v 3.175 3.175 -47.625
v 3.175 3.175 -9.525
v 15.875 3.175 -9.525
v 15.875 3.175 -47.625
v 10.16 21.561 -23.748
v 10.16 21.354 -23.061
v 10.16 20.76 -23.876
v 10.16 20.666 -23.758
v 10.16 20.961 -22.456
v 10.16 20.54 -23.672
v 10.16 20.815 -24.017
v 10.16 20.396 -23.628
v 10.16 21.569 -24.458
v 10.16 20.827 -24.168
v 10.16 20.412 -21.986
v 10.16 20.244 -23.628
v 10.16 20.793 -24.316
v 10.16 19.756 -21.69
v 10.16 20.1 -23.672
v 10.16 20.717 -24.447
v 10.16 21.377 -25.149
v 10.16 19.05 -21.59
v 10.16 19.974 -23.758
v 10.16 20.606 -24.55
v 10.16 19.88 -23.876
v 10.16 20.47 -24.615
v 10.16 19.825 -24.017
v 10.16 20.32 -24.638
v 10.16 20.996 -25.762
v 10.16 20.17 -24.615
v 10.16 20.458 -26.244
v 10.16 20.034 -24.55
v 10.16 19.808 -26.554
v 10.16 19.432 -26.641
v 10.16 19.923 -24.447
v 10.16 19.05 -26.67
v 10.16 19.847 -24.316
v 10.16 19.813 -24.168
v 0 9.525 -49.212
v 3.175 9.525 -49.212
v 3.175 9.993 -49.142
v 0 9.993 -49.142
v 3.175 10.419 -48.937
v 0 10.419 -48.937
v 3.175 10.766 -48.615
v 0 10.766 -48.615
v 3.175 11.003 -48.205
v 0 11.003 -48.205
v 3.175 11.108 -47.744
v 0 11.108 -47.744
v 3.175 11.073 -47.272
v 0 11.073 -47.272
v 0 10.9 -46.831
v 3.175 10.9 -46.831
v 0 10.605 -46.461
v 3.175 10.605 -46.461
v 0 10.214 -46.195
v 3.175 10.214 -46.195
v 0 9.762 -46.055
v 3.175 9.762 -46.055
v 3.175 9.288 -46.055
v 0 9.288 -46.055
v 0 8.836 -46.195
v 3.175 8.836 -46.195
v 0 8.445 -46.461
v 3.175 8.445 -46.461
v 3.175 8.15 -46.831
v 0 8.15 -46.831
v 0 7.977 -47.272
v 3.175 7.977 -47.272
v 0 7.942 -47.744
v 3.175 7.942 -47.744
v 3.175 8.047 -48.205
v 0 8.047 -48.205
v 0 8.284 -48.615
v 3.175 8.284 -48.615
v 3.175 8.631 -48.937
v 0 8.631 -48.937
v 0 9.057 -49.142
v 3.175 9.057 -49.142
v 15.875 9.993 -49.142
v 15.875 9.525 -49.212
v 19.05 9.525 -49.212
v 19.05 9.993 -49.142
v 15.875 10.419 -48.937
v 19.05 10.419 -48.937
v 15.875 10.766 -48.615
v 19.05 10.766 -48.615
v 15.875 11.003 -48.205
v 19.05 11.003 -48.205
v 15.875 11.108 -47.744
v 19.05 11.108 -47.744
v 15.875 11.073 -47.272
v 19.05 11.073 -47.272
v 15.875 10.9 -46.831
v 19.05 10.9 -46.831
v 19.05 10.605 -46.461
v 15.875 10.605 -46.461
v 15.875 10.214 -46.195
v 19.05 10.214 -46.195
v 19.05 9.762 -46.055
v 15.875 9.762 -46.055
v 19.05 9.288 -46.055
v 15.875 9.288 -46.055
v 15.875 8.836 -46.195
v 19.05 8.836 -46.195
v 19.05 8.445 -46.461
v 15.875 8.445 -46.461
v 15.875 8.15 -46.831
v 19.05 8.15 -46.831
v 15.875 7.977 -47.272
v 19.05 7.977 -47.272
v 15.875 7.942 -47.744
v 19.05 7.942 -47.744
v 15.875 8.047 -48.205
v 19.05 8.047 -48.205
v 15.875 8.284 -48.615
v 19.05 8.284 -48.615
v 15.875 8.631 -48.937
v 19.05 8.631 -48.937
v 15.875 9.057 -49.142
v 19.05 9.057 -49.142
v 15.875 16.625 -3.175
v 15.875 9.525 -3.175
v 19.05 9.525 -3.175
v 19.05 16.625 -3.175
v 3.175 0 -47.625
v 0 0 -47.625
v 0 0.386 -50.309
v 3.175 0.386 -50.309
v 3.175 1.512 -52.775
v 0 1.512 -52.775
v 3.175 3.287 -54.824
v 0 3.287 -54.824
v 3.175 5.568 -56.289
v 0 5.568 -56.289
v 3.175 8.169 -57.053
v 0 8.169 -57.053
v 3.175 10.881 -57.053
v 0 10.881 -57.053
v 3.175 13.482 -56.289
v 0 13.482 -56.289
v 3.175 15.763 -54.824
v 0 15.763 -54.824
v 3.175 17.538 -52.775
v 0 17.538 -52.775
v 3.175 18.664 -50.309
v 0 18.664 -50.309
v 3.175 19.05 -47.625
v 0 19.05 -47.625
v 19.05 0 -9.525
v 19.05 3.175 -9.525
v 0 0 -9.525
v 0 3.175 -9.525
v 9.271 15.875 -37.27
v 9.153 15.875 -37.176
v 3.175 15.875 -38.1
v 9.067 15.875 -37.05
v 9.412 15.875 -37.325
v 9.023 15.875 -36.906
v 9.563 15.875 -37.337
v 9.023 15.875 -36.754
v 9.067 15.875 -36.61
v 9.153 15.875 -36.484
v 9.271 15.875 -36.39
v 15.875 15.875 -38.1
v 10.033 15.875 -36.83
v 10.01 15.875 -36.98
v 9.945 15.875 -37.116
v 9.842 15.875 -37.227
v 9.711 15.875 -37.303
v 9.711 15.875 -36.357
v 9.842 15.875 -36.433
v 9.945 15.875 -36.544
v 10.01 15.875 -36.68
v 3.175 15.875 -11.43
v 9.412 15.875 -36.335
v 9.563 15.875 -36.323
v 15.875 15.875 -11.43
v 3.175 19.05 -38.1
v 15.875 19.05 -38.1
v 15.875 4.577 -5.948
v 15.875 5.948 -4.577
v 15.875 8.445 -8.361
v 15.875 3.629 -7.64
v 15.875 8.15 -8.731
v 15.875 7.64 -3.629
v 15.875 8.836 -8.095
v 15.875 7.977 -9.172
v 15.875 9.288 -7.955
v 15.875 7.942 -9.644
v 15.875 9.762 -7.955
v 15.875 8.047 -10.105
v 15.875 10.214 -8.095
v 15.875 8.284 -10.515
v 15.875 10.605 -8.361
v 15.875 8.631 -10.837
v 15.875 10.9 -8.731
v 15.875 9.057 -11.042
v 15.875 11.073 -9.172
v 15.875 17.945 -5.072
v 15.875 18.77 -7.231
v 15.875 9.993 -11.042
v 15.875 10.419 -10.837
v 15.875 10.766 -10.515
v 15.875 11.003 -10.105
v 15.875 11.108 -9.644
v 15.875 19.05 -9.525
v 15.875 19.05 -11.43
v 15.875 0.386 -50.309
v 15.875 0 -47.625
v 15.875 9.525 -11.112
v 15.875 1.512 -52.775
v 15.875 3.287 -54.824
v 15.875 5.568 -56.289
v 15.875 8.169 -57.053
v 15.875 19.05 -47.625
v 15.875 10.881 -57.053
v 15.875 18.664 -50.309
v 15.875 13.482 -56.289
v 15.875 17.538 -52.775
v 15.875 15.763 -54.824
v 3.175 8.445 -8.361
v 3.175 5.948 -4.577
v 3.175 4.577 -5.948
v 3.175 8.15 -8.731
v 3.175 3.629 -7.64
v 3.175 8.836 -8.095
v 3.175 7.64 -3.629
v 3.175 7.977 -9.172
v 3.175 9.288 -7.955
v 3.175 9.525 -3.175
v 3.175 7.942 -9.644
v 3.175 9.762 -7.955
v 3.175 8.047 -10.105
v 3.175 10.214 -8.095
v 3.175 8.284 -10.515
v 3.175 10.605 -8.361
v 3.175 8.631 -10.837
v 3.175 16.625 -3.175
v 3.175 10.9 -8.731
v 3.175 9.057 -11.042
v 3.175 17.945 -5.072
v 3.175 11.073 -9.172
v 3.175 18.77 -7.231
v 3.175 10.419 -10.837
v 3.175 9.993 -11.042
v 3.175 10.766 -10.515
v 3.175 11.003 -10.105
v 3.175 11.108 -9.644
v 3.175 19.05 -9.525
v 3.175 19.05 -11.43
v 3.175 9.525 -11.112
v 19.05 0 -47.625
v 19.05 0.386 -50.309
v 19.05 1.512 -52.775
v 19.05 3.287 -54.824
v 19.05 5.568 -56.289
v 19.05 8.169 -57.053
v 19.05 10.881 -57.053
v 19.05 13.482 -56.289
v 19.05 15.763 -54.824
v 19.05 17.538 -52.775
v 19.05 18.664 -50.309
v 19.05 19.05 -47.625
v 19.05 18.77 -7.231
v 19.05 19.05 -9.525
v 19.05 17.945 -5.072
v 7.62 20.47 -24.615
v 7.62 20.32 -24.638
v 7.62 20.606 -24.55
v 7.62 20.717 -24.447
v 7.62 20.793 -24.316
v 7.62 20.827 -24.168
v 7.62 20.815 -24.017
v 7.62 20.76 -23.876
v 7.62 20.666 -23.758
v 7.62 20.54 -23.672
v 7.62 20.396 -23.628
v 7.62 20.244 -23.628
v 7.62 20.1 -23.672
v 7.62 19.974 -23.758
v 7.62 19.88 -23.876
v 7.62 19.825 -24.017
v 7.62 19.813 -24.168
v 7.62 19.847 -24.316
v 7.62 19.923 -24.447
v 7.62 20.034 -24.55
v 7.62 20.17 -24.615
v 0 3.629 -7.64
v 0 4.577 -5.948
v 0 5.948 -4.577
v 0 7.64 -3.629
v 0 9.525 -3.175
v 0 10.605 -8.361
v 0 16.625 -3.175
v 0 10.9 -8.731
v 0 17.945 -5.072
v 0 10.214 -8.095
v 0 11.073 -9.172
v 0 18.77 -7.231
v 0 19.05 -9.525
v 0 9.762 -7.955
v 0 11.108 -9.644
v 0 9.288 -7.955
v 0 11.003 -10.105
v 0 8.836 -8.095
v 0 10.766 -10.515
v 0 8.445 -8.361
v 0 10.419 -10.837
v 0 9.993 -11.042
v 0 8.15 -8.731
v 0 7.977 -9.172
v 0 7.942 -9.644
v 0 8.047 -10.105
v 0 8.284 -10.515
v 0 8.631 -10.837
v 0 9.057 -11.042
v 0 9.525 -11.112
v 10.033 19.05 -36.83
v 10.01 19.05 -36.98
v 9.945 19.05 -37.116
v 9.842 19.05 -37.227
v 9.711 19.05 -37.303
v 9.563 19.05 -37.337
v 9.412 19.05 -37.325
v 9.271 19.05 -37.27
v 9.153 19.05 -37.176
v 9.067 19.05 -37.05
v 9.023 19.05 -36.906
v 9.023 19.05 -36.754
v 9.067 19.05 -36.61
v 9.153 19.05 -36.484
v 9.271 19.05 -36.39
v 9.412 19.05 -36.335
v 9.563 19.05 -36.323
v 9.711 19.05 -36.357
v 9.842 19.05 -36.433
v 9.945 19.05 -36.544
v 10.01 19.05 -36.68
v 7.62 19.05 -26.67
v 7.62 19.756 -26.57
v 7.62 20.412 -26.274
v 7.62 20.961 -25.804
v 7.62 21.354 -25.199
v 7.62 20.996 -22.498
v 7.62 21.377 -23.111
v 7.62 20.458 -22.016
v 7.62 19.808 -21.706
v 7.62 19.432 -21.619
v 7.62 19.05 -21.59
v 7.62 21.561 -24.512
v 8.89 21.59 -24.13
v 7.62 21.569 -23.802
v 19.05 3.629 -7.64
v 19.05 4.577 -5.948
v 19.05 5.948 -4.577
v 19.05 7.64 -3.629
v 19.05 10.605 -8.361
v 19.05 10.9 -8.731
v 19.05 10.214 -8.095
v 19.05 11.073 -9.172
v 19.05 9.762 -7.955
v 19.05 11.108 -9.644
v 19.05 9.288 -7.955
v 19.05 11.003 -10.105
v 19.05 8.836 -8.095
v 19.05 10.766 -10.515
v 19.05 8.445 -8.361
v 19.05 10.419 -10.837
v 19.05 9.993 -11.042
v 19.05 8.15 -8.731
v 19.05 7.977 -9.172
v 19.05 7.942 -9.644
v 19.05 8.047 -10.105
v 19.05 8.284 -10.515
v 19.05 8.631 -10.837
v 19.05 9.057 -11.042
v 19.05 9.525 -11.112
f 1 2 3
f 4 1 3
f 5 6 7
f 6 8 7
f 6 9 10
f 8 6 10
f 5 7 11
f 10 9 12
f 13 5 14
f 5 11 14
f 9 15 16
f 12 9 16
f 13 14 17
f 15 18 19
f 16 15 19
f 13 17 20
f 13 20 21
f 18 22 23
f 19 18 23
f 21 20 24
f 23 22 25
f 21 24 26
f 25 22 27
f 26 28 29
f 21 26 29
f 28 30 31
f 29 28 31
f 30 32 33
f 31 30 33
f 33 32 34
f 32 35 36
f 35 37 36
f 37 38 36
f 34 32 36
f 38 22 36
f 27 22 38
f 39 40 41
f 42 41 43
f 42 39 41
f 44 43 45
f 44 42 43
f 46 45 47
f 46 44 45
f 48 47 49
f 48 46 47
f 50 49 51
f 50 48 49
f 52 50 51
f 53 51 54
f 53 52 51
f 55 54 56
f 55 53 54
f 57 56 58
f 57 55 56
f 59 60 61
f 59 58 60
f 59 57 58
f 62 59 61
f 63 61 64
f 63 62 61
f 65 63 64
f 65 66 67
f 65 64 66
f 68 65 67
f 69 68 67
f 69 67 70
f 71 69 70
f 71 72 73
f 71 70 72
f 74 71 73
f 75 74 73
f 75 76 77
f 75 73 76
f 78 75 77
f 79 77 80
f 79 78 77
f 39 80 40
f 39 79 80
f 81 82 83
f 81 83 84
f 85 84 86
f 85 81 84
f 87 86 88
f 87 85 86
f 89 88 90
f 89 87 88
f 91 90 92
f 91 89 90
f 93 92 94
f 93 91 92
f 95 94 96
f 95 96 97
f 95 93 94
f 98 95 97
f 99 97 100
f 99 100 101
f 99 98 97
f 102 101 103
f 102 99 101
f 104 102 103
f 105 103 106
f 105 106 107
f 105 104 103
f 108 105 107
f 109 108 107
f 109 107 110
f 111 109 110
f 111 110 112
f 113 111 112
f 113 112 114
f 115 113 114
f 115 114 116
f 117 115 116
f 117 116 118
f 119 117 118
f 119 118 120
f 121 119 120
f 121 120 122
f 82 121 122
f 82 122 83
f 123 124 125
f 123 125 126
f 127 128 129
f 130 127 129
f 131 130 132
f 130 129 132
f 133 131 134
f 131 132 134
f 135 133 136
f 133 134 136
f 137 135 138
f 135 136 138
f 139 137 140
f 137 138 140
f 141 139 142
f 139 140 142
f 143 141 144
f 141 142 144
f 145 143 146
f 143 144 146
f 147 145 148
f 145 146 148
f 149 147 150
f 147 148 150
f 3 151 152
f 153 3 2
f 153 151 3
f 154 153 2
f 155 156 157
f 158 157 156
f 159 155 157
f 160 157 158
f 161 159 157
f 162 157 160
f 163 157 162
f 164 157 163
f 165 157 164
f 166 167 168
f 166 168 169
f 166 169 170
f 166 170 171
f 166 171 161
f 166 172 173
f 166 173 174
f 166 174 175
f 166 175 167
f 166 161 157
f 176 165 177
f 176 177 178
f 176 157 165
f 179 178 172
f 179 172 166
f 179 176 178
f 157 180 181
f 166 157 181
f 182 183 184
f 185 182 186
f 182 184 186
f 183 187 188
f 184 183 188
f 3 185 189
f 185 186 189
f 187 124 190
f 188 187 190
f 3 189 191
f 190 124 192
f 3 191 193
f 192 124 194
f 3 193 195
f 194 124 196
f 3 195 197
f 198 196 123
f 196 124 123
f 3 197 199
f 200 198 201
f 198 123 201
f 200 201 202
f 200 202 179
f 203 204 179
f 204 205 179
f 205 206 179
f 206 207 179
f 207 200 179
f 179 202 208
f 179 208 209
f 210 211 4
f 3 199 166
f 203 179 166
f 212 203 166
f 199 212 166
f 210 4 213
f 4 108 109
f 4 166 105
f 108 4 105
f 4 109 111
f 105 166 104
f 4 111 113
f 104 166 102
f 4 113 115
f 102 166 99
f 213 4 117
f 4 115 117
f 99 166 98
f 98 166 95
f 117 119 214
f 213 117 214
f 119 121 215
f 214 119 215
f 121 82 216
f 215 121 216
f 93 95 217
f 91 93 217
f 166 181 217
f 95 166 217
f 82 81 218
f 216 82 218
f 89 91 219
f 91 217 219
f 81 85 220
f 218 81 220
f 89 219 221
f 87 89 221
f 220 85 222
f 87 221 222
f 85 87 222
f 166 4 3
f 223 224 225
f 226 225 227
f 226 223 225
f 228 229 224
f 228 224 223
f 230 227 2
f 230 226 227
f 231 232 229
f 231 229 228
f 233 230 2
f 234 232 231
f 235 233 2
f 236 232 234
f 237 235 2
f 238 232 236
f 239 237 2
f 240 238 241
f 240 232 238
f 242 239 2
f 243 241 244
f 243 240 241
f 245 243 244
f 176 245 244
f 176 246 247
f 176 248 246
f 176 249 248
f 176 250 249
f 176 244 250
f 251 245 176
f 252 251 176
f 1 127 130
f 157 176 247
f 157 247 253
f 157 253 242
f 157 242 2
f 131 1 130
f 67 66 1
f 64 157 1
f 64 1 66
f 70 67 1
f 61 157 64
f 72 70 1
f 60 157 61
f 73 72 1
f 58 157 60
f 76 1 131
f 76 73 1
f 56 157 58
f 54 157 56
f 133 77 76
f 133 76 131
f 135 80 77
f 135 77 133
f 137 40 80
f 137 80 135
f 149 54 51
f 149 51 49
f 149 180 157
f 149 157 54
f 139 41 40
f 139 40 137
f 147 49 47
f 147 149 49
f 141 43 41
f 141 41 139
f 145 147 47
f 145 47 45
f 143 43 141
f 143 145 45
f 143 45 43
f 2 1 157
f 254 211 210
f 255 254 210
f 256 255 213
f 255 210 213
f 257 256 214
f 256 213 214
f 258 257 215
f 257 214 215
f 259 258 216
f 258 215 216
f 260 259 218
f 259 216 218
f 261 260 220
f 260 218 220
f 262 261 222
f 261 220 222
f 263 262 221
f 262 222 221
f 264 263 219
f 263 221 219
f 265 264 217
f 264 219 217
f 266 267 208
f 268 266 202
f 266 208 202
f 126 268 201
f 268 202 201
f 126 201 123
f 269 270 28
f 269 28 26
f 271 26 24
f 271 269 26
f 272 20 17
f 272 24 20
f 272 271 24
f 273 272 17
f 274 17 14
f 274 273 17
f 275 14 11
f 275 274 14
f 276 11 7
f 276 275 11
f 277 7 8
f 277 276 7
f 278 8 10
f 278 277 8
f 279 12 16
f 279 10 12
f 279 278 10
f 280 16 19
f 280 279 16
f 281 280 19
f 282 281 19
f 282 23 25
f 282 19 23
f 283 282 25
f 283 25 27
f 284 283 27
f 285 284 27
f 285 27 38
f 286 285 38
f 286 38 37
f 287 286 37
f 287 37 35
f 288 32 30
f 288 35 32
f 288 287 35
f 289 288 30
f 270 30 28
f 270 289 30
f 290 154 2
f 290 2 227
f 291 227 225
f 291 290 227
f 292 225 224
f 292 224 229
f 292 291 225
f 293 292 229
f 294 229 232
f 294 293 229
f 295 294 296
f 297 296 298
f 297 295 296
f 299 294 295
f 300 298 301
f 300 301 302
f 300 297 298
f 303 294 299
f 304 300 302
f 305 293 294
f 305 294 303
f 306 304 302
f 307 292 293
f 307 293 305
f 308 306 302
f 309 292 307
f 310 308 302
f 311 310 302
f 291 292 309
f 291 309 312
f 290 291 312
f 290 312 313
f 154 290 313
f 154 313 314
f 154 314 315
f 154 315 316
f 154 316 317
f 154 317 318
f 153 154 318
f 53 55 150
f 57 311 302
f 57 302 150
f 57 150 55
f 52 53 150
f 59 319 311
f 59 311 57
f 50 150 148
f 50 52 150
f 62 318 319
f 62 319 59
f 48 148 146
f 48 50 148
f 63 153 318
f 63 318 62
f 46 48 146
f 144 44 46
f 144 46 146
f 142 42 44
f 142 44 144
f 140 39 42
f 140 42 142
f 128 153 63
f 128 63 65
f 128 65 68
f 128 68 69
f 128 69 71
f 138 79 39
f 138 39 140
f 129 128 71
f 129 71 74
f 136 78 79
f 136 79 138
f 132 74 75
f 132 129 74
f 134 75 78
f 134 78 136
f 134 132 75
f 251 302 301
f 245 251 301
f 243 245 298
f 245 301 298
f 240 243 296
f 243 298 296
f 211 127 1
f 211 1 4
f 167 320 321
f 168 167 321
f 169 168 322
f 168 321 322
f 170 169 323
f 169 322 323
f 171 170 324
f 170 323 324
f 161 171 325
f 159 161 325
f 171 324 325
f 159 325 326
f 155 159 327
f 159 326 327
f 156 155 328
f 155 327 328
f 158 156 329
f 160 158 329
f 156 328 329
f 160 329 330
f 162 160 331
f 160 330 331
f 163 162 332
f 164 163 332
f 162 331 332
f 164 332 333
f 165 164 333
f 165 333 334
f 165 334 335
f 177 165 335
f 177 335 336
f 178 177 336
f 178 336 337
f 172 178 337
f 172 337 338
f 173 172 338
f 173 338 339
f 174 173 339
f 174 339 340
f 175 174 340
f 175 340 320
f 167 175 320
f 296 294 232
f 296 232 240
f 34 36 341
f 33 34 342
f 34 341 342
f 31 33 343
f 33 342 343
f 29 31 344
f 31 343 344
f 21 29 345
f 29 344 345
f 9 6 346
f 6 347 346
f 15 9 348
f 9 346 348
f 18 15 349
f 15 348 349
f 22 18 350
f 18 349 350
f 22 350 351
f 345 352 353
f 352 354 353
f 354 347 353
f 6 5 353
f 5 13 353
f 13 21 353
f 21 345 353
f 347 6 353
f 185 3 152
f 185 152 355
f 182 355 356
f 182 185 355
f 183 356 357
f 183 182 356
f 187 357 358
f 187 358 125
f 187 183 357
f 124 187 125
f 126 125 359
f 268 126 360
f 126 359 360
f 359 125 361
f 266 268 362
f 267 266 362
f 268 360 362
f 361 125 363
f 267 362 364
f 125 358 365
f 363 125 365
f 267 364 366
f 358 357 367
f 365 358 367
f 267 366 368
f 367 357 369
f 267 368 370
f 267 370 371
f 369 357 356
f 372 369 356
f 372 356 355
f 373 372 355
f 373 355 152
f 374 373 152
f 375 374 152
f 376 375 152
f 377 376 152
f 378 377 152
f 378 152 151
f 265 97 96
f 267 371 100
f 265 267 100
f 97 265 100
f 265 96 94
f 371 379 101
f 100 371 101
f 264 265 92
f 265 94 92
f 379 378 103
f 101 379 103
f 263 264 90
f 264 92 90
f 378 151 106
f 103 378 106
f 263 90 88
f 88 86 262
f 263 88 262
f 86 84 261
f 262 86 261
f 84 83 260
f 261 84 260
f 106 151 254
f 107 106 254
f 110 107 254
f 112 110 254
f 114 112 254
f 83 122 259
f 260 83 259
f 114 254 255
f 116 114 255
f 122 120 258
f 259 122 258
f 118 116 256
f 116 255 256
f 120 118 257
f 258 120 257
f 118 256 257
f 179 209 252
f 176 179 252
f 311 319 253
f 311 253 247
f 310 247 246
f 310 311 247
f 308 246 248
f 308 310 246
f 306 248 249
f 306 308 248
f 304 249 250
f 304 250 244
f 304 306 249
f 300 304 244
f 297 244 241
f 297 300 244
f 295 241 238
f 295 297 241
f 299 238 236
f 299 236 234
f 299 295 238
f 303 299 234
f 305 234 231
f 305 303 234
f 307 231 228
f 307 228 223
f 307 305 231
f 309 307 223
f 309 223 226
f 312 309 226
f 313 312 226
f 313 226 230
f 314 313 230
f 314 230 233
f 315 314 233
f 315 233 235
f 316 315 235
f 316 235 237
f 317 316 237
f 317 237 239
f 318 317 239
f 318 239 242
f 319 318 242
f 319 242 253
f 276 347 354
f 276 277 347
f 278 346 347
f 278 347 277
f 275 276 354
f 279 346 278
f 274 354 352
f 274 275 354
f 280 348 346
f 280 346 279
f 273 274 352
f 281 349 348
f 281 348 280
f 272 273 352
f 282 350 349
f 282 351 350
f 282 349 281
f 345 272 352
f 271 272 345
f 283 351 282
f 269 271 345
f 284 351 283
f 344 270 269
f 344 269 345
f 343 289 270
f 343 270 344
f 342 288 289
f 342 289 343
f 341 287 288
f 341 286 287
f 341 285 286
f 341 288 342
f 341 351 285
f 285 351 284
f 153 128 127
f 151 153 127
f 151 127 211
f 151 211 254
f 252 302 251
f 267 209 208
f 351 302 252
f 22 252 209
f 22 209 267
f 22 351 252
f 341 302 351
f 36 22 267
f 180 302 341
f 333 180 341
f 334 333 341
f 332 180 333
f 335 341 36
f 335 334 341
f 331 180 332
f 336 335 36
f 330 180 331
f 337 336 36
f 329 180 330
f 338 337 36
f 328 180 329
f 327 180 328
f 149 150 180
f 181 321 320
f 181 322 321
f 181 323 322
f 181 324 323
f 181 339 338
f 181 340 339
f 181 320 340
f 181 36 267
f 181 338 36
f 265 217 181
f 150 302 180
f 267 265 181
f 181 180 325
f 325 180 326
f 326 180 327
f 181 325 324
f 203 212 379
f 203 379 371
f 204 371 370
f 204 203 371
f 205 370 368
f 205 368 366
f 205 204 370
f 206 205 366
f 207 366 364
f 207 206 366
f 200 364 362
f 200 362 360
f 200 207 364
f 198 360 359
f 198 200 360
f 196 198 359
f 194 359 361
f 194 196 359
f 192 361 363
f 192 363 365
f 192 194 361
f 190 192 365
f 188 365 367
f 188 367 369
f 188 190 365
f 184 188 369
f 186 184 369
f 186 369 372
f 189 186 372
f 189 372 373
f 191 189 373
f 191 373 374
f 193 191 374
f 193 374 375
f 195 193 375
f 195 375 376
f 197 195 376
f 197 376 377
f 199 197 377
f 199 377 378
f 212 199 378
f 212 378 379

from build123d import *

# Parameters (mm, degrees)
SKETCH1_W           = 19.05
SKETCH1_H           = 57.15
BOSS_EXTRUDE1_DEPTH = 19.05
SKETCH2_W           = 12.7
SKETCH2_H           = 12.7
CUT_EXTRUDE1_DEPTH  = 76.2
SKETCH3_W           = 2.54
SKETCH3_H           = 5.08
BOSS_EXTRUDE2_DEPTH = 2.54
SKETCH4_R           = 0.508
SKETCH4_R_2         = 1.5875
CUT_EXTRUDE2_DEPTH  = 19.05
SKETCH7_R           = 0.508
CUT_EXTRUDE3_DEPTH  = 12.7
SKETCH8_W           = 12.7
SKETCH8_H           = 9.525
CUT_EXTRUDE4_DEPTH  = 25.4
SKETCH11_R          = 1.5875
CUT_EXTRUDE6_DEPTH  = 19.05
SKETCH12_W          = 12.7
SKETCH12_H          = 30.970960978
CUT_EXTRUDE7_DEPTH  = 3.81
SKETCH13_W          = 12.7
SKETCH13_H          = 19.463069007
CUT_EXTRUDE8_DEPTH  = 3.81
CUT_EXTRUDE9_DEPTH  = 19.05


with BuildPart() as part:
    # Sketch1 → Boss-Extrude1 (new body)
    with BuildSketch(Plane(origin=(0, 0, 0), x_dir=(1, 0, 0), z_dir=(0, 1, 0))):
        with Locations((9.525, 28.575)):
            Rectangle(SKETCH1_W, SKETCH1_H)
    extrude(amount=BOSS_EXTRUDE1_DEPTH)

    # Sketch2 → Cut-Extrude1 (cut)
    with BuildSketch(Plane.XY):
        with Locations((9.525, 9.525)):
            Rectangle(SKETCH2_W, SKETCH2_H)
    extrude(amount=-CUT_EXTRUDE1_DEPTH, mode=Mode.SUBTRACT)

    # Sketch3 → Boss-Extrude2 (add)
    with BuildSketch(Plane(origin=(0, 19.05, 0), x_dir=(1, 0, 0), z_dir=(0, 1, 0))):
        with Locations((8.89, 24.13)):
            Rectangle(SKETCH3_W, SKETCH3_H)
    extrude(amount=BOSS_EXTRUDE2_DEPTH)

    # Sketch4 → Cut-Extrude2 (cut)
    with BuildSketch(Plane(origin=(0, 0, 0), x_dir=(0, 0, -1), z_dir=(1, 0, 0))):
        with Locations((24.13, 20.32)):
            Circle(SKETCH4_R)
        with Locations((9.525, 9.525)):
            Circle(SKETCH4_R_2)
        with BuildLine():
            ThreePointArc((26.67, 19.05), (24.13, 24.78976855), (21.59, 19.05))
            add(Edge.make_bspline(
                [(26.67, 19.05), (26.67, 21.59), (24.13, 21.59), (21.59, 21.59), (21.59, 19.05)],
                knots=[3.141592654, 3.141592654, 3.141592654, 4.71238898, 4.71238898, 6.283185307, 6.283185307, 6.283185307], degree=2, weights=[1, 0.707106781, 1, 0.707106781, 1]))
        make_face()
        with BuildLine():
            ThreePointArc((9.525, 19.05), (0, 9.525), (9.525, 0))
            ThreePointArc((9.525, 0), (-29.420443119, 9.525), (9.525, 19.05))
        make_face()
    extrude(amount=CUT_EXTRUDE2_DEPTH, mode=Mode.SUBTRACT)

    # Sketch7 → Cut-Extrude3 (cut)
    with BuildSketch(Plane(origin=(0, 19.05, 0), x_dir=(1, 0, 0), z_dir=(0, 1, 0))):
        with Locations((9.525, 36.83)):
            Circle(SKETCH7_R)
        Polygon((3.175, 0), (3.175, 11.43), (6.35, 11.43), (12.7, 11.43), (15.875, 11.43), (15.875, 0), align=None)
    extrude(amount=-CUT_EXTRUDE3_DEPTH, mode=Mode.SUBTRACT)

    # Sketch8 → Cut-Extrude4 (cut)
    with BuildSketch(Plane(origin=(0, 19.05, 0), x_dir=(1, 0, 0), z_dir=(0, 1, 0))):
        with Locations((9.525, 4.7625)):
            Rectangle(SKETCH8_W, SKETCH8_H)
    extrude(amount=-CUT_EXTRUDE4_DEPTH, mode=Mode.SUBTRACT)

    # Sketch11 → Cut-Extrude6 (cut)
    with BuildSketch(Plane(origin=(0, 0, 0), x_dir=(0, 0, -1), z_dir=(1, 0, 0))):
        with Locations((47.625, 9.525)):
            Circle(SKETCH11_R)
        with BuildLine():
            ThreePointArc((47.625, 0), (57.15, 9.525), (47.625, 19.05))
            ThreePointArc((47.625, 19.05), (63.905355935, 9.525), (47.625, 0))
        make_face()
    extrude(amount=CUT_EXTRUDE6_DEPTH, mode=Mode.SUBTRACT)

    # Sketch12 → Cut-Extrude7 (cut)
    with BuildSketch(Plane(origin=(0, 19.05, 0), x_dir=(1, 0, 0), z_dir=(0, 1, 0))):
        with Locations((9.525, 53.585480489)):
            Rectangle(SKETCH12_W, SKETCH12_H)
    extrude(amount=-CUT_EXTRUDE7_DEPTH, mode=Mode.SUBTRACT)

    # Sketch13 → Cut-Extrude8 (cut)
    with BuildSketch(Plane(origin=(0, 0, 0), x_dir=(1, 0, 0), z_dir=(0, 1, 0))):
        with Locations((9.525, 57.356534504)):
            Rectangle(SKETCH13_W, SKETCH13_H)
    extrude(amount=CUT_EXTRUDE8_DEPTH, mode=Mode.SUBTRACT)

    # Sketch14 → Cut-Extrude9 (cut)
    with BuildSketch(Plane(origin=(0, 0, 0), x_dir=(0, 0, -1), z_dir=(1, 0, 0))):
        with BuildLine():
            Line((9.525, 0), (9.525, 3.175))
            ThreePointArc((9.525, 3.175), (5.21507822, 5.21507822), (3.175, 9.525))
            Line((3.175, 9.525), (3.175, 18.741336737))
            Line((3.175, 18.741336737), (-3.728591213, 9.978700773))
            Line((-3.728591213, 9.978700773), (-2.544461104, 0))
            Line((-2.544461104, 0), (9.525, 0))
        make_face()
    extrude(amount=CUT_EXTRUDE9_DEPTH, mode=Mode.SUBTRACT)


solid = part.part
